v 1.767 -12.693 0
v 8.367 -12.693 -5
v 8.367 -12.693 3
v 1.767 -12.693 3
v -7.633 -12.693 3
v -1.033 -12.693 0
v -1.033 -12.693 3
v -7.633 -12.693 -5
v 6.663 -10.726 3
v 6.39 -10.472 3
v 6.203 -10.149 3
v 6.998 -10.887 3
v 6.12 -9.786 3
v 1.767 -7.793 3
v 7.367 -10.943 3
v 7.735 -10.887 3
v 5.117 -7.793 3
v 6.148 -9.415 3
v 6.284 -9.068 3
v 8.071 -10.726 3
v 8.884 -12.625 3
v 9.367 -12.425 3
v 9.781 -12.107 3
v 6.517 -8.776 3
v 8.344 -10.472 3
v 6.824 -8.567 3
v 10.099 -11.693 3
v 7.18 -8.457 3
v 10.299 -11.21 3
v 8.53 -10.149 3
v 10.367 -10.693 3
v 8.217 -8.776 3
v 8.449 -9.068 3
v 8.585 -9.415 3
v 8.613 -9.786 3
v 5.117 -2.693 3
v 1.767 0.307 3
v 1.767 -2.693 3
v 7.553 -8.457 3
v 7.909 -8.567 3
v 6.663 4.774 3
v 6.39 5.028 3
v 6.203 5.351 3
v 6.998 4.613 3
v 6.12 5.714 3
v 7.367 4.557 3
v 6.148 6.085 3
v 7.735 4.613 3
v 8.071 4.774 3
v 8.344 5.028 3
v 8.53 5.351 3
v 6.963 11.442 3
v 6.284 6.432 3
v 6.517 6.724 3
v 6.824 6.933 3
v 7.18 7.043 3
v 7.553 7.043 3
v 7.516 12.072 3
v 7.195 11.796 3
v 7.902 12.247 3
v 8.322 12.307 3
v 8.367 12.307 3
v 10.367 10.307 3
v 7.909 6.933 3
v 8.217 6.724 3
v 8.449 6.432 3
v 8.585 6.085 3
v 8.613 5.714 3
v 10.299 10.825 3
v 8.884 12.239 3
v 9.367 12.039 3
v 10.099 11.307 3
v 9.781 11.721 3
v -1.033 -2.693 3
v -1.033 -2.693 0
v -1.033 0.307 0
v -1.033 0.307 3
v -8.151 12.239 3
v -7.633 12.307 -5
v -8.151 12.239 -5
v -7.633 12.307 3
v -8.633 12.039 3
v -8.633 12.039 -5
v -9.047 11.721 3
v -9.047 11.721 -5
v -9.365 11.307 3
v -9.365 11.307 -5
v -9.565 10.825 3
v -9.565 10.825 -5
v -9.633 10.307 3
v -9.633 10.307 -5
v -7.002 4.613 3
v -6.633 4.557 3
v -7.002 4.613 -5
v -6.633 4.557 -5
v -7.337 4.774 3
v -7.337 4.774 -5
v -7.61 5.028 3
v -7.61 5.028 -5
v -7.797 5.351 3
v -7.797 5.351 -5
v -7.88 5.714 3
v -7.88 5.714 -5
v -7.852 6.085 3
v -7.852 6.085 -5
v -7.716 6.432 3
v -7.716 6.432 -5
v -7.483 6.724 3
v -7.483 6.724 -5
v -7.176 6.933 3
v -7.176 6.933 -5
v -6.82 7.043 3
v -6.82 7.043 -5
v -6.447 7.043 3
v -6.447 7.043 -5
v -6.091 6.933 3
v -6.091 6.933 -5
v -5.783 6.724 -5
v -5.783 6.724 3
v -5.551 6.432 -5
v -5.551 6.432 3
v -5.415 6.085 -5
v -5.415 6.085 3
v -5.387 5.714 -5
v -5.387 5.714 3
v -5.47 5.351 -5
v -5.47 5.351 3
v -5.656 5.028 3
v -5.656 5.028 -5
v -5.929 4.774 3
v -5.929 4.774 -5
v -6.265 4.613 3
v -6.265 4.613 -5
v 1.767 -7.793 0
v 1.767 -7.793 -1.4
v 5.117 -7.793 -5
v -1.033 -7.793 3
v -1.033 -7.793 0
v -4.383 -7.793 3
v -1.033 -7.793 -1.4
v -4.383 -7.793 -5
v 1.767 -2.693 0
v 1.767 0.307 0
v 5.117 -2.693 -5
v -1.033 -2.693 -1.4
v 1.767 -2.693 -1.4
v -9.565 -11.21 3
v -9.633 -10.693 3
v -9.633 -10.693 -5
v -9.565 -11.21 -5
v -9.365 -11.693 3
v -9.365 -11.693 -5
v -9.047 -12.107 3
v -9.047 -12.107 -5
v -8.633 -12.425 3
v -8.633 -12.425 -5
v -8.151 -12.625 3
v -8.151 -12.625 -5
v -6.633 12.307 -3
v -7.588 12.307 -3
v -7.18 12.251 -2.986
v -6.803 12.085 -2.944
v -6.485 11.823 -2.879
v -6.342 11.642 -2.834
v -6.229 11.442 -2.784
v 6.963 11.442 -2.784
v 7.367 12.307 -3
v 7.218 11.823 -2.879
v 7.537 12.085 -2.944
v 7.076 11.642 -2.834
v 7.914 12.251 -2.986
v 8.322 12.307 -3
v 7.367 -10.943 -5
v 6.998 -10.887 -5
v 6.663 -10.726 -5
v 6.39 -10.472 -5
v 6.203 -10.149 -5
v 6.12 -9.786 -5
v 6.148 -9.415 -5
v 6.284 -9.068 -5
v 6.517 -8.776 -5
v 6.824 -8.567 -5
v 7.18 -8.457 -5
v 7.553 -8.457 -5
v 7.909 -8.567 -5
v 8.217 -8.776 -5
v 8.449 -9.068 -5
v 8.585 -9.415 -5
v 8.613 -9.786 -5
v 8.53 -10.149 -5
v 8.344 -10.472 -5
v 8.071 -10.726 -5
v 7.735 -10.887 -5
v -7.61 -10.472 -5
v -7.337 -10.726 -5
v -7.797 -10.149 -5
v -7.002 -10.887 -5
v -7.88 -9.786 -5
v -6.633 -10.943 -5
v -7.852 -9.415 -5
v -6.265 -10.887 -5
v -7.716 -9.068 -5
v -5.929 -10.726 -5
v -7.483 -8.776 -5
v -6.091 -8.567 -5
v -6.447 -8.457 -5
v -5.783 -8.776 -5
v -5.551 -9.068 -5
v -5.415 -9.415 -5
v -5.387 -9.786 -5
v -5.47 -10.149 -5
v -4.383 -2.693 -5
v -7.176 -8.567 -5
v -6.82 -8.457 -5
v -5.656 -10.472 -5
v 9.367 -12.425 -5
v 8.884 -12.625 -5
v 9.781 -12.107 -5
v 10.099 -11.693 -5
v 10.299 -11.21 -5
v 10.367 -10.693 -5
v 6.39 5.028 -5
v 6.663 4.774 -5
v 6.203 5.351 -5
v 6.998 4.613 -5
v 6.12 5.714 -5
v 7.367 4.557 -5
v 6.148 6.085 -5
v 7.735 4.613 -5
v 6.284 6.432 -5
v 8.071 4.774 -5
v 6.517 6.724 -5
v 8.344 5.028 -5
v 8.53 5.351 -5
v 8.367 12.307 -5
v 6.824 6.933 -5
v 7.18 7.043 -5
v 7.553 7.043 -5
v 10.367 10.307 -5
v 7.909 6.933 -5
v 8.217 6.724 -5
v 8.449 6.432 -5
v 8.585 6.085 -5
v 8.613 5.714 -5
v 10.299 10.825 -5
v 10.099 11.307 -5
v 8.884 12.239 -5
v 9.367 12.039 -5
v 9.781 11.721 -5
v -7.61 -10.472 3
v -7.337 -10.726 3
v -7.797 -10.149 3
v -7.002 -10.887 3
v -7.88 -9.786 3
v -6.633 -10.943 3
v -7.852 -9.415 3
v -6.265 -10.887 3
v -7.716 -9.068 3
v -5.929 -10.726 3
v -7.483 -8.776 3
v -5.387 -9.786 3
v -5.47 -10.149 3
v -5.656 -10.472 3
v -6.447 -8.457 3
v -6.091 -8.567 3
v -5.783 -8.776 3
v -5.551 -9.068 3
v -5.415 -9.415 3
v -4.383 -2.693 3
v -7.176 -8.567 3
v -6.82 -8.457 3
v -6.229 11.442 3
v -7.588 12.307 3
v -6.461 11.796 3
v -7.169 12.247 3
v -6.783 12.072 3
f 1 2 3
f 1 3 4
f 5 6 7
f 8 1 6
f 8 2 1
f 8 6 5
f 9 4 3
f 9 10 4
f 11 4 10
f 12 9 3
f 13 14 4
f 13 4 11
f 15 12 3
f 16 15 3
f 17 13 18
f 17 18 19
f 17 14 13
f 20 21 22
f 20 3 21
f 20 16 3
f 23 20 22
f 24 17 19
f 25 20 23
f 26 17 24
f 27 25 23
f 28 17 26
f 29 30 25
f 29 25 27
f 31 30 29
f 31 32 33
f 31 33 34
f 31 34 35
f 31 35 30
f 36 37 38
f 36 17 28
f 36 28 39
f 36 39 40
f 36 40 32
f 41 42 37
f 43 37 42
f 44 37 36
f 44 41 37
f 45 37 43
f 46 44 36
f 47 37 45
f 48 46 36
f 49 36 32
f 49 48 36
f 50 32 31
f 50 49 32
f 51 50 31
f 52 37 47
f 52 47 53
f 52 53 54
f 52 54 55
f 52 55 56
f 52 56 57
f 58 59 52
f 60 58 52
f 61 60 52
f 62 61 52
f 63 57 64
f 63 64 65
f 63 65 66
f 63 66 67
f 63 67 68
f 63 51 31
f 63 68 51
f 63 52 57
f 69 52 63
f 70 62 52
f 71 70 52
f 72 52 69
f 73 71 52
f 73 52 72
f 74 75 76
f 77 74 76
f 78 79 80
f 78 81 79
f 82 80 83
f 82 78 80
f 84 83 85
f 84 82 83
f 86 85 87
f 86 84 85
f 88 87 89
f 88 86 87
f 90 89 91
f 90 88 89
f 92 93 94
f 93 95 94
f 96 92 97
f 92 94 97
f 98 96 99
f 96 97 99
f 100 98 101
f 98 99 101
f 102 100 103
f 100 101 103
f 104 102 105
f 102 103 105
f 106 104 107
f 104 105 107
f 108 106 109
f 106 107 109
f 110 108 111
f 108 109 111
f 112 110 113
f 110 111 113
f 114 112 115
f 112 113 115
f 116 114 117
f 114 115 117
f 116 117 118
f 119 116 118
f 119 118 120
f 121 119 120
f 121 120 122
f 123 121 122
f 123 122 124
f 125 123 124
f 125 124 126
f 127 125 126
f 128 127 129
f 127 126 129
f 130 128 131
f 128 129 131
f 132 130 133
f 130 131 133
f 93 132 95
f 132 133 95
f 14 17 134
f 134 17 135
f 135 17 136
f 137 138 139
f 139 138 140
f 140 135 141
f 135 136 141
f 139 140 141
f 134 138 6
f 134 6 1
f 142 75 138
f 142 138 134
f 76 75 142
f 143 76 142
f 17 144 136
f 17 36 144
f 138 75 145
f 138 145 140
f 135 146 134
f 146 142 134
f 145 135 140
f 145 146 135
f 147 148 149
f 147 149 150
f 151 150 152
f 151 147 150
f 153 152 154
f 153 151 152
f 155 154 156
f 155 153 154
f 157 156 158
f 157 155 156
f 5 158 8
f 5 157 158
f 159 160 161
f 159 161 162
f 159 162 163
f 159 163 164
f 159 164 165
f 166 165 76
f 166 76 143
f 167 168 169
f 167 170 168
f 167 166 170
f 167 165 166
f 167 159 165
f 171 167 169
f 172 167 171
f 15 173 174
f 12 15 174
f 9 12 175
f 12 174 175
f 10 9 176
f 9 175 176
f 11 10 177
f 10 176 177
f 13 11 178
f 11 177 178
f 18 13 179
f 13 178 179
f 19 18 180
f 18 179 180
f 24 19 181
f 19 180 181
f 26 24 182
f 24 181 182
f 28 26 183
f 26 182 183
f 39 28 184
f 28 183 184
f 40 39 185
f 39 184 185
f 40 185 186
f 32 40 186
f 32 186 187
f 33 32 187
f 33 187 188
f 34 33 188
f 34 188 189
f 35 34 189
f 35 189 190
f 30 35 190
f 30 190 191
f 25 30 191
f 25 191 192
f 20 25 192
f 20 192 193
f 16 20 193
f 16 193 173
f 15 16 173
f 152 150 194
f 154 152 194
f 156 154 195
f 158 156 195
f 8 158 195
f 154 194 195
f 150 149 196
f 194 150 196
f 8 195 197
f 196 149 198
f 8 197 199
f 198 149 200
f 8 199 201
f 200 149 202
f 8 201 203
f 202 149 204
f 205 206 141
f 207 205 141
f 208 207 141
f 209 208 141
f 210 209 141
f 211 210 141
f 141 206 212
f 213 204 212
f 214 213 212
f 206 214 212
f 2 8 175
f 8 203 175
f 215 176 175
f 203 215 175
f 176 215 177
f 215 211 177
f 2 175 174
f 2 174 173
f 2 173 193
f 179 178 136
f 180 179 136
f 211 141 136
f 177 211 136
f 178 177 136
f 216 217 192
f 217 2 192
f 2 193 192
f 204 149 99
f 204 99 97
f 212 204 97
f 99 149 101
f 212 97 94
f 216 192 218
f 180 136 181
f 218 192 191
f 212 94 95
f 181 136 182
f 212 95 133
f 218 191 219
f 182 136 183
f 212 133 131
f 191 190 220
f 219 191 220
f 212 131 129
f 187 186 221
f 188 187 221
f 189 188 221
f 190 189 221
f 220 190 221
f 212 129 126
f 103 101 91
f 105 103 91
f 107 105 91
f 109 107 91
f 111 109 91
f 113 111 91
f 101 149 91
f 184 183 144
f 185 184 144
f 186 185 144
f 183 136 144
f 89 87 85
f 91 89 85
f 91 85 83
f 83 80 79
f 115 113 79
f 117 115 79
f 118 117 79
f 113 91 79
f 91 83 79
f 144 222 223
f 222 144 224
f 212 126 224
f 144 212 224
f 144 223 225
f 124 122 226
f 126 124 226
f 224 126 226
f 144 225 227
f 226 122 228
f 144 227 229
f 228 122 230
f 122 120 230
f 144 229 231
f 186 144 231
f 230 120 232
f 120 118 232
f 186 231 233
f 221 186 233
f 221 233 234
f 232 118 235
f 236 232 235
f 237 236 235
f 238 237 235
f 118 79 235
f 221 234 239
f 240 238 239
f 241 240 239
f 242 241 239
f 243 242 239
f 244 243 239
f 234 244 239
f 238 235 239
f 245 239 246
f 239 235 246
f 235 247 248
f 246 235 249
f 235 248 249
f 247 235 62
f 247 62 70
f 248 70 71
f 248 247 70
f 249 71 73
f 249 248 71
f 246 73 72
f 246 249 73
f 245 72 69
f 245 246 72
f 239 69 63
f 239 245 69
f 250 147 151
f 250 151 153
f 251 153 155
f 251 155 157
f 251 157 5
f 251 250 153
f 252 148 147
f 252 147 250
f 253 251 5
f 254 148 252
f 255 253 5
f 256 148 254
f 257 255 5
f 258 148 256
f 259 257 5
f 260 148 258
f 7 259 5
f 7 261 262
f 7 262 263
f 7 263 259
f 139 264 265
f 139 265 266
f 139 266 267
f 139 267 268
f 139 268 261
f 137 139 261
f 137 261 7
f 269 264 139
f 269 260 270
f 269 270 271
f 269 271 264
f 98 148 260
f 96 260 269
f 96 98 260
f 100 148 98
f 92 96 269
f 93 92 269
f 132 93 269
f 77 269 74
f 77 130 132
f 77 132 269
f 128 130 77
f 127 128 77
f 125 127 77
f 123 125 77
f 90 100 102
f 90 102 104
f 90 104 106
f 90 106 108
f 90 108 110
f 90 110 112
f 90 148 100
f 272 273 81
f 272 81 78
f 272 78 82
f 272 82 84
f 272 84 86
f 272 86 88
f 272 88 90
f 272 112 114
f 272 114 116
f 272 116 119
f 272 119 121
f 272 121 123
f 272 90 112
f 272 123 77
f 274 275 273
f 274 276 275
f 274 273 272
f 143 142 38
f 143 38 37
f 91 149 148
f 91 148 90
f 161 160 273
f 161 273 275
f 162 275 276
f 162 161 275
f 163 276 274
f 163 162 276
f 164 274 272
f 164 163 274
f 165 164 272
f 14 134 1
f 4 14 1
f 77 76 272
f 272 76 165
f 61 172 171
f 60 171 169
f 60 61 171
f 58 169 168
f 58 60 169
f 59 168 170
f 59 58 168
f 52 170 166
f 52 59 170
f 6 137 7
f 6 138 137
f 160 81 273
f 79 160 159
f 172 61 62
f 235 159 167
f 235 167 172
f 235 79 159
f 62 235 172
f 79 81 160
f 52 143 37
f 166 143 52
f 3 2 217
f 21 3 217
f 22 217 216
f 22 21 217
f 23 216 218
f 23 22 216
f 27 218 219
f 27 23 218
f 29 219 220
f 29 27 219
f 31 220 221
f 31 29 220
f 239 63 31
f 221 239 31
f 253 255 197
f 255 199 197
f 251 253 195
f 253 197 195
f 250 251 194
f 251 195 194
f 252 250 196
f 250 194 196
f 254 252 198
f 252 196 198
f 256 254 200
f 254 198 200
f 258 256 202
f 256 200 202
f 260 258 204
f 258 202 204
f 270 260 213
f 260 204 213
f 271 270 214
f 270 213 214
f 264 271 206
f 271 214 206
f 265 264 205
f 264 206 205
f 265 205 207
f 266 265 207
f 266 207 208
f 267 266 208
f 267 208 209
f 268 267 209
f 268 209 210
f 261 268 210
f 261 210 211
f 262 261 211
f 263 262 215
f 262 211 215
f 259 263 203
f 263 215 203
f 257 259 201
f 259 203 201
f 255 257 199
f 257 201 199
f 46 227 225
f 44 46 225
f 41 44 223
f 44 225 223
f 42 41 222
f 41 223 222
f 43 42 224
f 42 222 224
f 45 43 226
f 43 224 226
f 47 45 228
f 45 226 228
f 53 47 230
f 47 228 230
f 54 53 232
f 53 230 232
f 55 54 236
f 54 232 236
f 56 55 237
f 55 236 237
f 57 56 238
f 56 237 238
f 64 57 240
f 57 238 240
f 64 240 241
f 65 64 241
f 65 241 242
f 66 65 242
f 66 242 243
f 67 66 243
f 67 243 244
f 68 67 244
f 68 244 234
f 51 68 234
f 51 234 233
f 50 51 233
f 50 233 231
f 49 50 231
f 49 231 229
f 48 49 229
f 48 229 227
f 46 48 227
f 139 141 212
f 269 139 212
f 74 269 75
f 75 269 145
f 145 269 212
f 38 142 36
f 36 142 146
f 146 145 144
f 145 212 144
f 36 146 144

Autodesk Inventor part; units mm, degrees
ref_plane "YZ Plane" through (0, 0, 0) normal (1, 0, 0) x (0, 1, 0)
ref_plane "XZ Plane" through (0, 0, 0) normal (0, 1, 0) x (-1, 0, 0)
ref_plane "XY Plane" through (0, 0, 0) normal (0, 0, 1) x (1, 0, 0)
sketch "Sketch1" plane through (0, 0, 0) normal (0, 0, 1) x (1, 0, 0)
  line L0 (-9.6332, 12.3072) -> (10.3668, 12.3072)
  line L1 (10.3668, 12.3072) -> (10.3668, -12.6928)
  line L2 (10.3668, -12.6928) -> (-9.6332, -12.6928)
  line L3 (-9.6332, -12.6928) -> (-9.6332, 12.3072)
  line L4 (-4.3832, -2.6928) -> (5.1168, -2.6928)
  line L5 (5.1168, -2.6928) -> (5.1168, -7.7928)
  line L6 (5.1168, -7.7928) -> (-4.3832, -7.7928)
  line L7 (-4.3832, -7.7928) -> (-4.3832, -2.6928)
  line L8 (-1.0332, -2.6928) -> (-1.0332, -7.7928)
  line L9 (1.7668, -2.6928) -> (1.7668, -7.7928)
  line L10 (-1.0332, -2.6928) -> (-1.0332, 0.3072)
  line L11 (1.7668, -2.6928) -> (1.7668, 0.3072)
  line L12 (-1.0332, 0.3072) -> (-6.6332, 12.3072)
  line L13 (1.7668, 0.3072) -> (7.3668, 12.3072)
  line L14 (-1.0332, -7.7928) -> (-1.0332, -12.6928)
  line L15 (1.7668, -7.7928) -> (1.7668, -12.6928)
  point P0 (0, 0)
  dimension "d0" = 20
  dimension "d1" = 25
  dimension "d2" = 3.35
  dimension "d3" = 3.35
  dimension "d4" = 2.8
  dimension "d5" = 5.1
  dimension "d6" = 5.25
  dimension "d7" = 9.5
  dimension "d9" = 15
  dimension "d10" = 4.9
  dimension "d11" = 3
  dimension "d12" = 3
  dimension "d13" = 3
  dimension "d14" = 3
extrude "Extrusion1" add sketch "Sketch1" along normal blind 3 contours L0 L12 L10 L4 L7 L6 L14 L2 L3 | L0 L1 L2 L15 L6 L5 L4 L11 L13
extrude "Extrusion2" add sketch "Sketch1" against normal blind 5 contours L0 L12 L10 L4 L7 L6 L14 L2 L3 | L0 L13 L11 L4 L10 L12 | L0 L1 L2 L15 L6 L5 L4 L11 L13 | L14 L6 L15 L2 | L4 L9 L6 L8
sketch "Sketch2" plane through (0, 0, -5) normal (0, 0, -1) x (-1, 0, 0)
  line L0 (-1.7668, -2.6928) -> (-1.7668, -7.7928) projected
  line L1 (-1.7668, -7.7928) -> (-5.1168, -7.7928) projected
  line L2 (-5.1168, -7.7928) -> (-5.1168, -2.6928) projected
  line L3 (-5.1168, -2.6928) -> (-1.7668, -2.6928) projected
  line L4 (1.0332, -7.7928) -> (1.0332, -2.6928) projected
  line L5 (1.0332, -2.6928) -> (4.3832, -2.6928) projected
  line L6 (4.3832, -2.6928) -> (4.3832, -7.7928) projected
  line L7 (4.3832, -7.7928) -> (1.0332, -7.7928) projected
  line L8 (9.6332, 12.3072) -> (-10.3668, 12.3072) projected
  line L9 (-10.3668, 12.3072) -> (-10.3668, -12.6928) projected
  line L10 (-10.3668, -12.6928) -> (9.6332, -12.6928) projected
  line L11 (9.6332, -12.6928) -> (9.6332, 12.3072) projected
  line L12 (1.0332, -12.6928) -> (1.0332, -7.7928) projected
  line L13 (-1.7668, -2.6928) -> (1.0332, -2.6928)
  line L14 (1.0332, -2.6928) -> (1.0332, -7.7928)
  line L15 (1.0332, -7.7928) -> (-1.7668, -7.7928)
  line L16 (-1.7668, -7.7928) -> (-1.7668, -2.6928)
  point P0 (0, 0)
extrude "Extrusion3" cut sketch "Sketch2" against normal blind 3.6 contours L13 L4 L15 L0
chamfer "Chamfer1" distance 12 distance2 3 1 edges at (0.3668, 12.3072, 0) measured on face at (-0.0999, 8.3072, 0)
sketch "Sketch3" plane through (0, 0, 3) normal (0, 0, 1) x (1, 0, 0)
  line L0 (-9.6332, 12.3072) -> (-9.6332, -12.6928) projected
  line L1 (-9.6332, -12.6928) -> (-1.0332, -12.6928) projected
  line L2 (-1.0332, -12.6928) -> (-1.0332, -7.7928) projected
  line L3 (-1.0332, -7.7928) -> (-4.3832, -7.7928) projected
  line L4 (-4.3832, -7.7928) -> (-4.3832, -2.6928) projected
  line L5 (-4.3832, -2.6928) -> (-1.0332, -2.6928) projected
  line L6 (-1.0332, -2.6928) -> (-1.0332, 0.3072) projected
  line L7 (-1.0332, 0.3072) -> (-6.6332, 12.3072) projected
  line L8 (-6.6332, 12.3072) -> (-9.6332, 12.3072) projected
  line L9 (10.3668, -12.6928) -> (10.3668, 12.3072) projected
  line L10 (10.3668, 12.3072) -> (7.3668, 12.3072) projected
  line L11 (7.3668, 12.3072) -> (1.7668, 0.3072) projected
  line L12 (1.7668, 0.3072) -> (1.7668, -2.6928) projected
  line L13 (1.7668, -2.6928) -> (5.1168, -2.6928) projected
  line L14 (5.1168, -2.6928) -> (5.1168, -7.7928) projected
  line L15 (5.1168, -7.7928) -> (1.7668, -7.7928) projected
  line L16 (1.7668, -7.7928) -> (1.7668, -12.6928) projected
  line L17 (1.7668, -12.6928) -> (10.3668, -12.6928) projected
  point P0 (0, 0)
  point P1 (-6.6332, 5.8072)
  point P2 (7.3668, 5.8072)
  point P3 (-6.6332, -9.6928)
  point P4 (7.3668, -9.6928)
  dimension "d24" = 25
  dimension "d25" = 6.5
  dimension "d26" = 3
  dimension "d27" = 4.9
  dimension "d28" = 3
  dimension "d29" = 3
  dimension "d37" = 5.25
  dimension "d38" = 3
  dimension "d39" = 3
hole "Hole1" at (-6.6332, 5.8072, 3) at (7.3668, 5.8072, 3) at (-6.6332, -9.6928, 3) at (7.3668, -9.6928, 3) direction (0, 0, -1) diameter 2.5 end through all
fillet "Fillet1" radius 1.5 2 edges at (-6.6332, 12.3072, 0) (7.3668, 12.3072, 0)
fillet "Fillet2" radius 2 4 edges at (-9.6332, 12.3072, -1) (10.3668, 12.3072, -1) (10.3668, -12.6928, -1) (-9.6332, -12.6928, -1)
equation "\"d3\" = d2"
equation "\"d6\" = -0.5 * d7 + 0.5 * d0"
equation "\"d12\" = d11"
equation "\"d14\" = d13"
equation "\"d29\" = d28"
equation "\"d39\" = d38"
properties part number "3DP_PLA_Part_Detector_Bottom_Half" material "ABS Plastic"
